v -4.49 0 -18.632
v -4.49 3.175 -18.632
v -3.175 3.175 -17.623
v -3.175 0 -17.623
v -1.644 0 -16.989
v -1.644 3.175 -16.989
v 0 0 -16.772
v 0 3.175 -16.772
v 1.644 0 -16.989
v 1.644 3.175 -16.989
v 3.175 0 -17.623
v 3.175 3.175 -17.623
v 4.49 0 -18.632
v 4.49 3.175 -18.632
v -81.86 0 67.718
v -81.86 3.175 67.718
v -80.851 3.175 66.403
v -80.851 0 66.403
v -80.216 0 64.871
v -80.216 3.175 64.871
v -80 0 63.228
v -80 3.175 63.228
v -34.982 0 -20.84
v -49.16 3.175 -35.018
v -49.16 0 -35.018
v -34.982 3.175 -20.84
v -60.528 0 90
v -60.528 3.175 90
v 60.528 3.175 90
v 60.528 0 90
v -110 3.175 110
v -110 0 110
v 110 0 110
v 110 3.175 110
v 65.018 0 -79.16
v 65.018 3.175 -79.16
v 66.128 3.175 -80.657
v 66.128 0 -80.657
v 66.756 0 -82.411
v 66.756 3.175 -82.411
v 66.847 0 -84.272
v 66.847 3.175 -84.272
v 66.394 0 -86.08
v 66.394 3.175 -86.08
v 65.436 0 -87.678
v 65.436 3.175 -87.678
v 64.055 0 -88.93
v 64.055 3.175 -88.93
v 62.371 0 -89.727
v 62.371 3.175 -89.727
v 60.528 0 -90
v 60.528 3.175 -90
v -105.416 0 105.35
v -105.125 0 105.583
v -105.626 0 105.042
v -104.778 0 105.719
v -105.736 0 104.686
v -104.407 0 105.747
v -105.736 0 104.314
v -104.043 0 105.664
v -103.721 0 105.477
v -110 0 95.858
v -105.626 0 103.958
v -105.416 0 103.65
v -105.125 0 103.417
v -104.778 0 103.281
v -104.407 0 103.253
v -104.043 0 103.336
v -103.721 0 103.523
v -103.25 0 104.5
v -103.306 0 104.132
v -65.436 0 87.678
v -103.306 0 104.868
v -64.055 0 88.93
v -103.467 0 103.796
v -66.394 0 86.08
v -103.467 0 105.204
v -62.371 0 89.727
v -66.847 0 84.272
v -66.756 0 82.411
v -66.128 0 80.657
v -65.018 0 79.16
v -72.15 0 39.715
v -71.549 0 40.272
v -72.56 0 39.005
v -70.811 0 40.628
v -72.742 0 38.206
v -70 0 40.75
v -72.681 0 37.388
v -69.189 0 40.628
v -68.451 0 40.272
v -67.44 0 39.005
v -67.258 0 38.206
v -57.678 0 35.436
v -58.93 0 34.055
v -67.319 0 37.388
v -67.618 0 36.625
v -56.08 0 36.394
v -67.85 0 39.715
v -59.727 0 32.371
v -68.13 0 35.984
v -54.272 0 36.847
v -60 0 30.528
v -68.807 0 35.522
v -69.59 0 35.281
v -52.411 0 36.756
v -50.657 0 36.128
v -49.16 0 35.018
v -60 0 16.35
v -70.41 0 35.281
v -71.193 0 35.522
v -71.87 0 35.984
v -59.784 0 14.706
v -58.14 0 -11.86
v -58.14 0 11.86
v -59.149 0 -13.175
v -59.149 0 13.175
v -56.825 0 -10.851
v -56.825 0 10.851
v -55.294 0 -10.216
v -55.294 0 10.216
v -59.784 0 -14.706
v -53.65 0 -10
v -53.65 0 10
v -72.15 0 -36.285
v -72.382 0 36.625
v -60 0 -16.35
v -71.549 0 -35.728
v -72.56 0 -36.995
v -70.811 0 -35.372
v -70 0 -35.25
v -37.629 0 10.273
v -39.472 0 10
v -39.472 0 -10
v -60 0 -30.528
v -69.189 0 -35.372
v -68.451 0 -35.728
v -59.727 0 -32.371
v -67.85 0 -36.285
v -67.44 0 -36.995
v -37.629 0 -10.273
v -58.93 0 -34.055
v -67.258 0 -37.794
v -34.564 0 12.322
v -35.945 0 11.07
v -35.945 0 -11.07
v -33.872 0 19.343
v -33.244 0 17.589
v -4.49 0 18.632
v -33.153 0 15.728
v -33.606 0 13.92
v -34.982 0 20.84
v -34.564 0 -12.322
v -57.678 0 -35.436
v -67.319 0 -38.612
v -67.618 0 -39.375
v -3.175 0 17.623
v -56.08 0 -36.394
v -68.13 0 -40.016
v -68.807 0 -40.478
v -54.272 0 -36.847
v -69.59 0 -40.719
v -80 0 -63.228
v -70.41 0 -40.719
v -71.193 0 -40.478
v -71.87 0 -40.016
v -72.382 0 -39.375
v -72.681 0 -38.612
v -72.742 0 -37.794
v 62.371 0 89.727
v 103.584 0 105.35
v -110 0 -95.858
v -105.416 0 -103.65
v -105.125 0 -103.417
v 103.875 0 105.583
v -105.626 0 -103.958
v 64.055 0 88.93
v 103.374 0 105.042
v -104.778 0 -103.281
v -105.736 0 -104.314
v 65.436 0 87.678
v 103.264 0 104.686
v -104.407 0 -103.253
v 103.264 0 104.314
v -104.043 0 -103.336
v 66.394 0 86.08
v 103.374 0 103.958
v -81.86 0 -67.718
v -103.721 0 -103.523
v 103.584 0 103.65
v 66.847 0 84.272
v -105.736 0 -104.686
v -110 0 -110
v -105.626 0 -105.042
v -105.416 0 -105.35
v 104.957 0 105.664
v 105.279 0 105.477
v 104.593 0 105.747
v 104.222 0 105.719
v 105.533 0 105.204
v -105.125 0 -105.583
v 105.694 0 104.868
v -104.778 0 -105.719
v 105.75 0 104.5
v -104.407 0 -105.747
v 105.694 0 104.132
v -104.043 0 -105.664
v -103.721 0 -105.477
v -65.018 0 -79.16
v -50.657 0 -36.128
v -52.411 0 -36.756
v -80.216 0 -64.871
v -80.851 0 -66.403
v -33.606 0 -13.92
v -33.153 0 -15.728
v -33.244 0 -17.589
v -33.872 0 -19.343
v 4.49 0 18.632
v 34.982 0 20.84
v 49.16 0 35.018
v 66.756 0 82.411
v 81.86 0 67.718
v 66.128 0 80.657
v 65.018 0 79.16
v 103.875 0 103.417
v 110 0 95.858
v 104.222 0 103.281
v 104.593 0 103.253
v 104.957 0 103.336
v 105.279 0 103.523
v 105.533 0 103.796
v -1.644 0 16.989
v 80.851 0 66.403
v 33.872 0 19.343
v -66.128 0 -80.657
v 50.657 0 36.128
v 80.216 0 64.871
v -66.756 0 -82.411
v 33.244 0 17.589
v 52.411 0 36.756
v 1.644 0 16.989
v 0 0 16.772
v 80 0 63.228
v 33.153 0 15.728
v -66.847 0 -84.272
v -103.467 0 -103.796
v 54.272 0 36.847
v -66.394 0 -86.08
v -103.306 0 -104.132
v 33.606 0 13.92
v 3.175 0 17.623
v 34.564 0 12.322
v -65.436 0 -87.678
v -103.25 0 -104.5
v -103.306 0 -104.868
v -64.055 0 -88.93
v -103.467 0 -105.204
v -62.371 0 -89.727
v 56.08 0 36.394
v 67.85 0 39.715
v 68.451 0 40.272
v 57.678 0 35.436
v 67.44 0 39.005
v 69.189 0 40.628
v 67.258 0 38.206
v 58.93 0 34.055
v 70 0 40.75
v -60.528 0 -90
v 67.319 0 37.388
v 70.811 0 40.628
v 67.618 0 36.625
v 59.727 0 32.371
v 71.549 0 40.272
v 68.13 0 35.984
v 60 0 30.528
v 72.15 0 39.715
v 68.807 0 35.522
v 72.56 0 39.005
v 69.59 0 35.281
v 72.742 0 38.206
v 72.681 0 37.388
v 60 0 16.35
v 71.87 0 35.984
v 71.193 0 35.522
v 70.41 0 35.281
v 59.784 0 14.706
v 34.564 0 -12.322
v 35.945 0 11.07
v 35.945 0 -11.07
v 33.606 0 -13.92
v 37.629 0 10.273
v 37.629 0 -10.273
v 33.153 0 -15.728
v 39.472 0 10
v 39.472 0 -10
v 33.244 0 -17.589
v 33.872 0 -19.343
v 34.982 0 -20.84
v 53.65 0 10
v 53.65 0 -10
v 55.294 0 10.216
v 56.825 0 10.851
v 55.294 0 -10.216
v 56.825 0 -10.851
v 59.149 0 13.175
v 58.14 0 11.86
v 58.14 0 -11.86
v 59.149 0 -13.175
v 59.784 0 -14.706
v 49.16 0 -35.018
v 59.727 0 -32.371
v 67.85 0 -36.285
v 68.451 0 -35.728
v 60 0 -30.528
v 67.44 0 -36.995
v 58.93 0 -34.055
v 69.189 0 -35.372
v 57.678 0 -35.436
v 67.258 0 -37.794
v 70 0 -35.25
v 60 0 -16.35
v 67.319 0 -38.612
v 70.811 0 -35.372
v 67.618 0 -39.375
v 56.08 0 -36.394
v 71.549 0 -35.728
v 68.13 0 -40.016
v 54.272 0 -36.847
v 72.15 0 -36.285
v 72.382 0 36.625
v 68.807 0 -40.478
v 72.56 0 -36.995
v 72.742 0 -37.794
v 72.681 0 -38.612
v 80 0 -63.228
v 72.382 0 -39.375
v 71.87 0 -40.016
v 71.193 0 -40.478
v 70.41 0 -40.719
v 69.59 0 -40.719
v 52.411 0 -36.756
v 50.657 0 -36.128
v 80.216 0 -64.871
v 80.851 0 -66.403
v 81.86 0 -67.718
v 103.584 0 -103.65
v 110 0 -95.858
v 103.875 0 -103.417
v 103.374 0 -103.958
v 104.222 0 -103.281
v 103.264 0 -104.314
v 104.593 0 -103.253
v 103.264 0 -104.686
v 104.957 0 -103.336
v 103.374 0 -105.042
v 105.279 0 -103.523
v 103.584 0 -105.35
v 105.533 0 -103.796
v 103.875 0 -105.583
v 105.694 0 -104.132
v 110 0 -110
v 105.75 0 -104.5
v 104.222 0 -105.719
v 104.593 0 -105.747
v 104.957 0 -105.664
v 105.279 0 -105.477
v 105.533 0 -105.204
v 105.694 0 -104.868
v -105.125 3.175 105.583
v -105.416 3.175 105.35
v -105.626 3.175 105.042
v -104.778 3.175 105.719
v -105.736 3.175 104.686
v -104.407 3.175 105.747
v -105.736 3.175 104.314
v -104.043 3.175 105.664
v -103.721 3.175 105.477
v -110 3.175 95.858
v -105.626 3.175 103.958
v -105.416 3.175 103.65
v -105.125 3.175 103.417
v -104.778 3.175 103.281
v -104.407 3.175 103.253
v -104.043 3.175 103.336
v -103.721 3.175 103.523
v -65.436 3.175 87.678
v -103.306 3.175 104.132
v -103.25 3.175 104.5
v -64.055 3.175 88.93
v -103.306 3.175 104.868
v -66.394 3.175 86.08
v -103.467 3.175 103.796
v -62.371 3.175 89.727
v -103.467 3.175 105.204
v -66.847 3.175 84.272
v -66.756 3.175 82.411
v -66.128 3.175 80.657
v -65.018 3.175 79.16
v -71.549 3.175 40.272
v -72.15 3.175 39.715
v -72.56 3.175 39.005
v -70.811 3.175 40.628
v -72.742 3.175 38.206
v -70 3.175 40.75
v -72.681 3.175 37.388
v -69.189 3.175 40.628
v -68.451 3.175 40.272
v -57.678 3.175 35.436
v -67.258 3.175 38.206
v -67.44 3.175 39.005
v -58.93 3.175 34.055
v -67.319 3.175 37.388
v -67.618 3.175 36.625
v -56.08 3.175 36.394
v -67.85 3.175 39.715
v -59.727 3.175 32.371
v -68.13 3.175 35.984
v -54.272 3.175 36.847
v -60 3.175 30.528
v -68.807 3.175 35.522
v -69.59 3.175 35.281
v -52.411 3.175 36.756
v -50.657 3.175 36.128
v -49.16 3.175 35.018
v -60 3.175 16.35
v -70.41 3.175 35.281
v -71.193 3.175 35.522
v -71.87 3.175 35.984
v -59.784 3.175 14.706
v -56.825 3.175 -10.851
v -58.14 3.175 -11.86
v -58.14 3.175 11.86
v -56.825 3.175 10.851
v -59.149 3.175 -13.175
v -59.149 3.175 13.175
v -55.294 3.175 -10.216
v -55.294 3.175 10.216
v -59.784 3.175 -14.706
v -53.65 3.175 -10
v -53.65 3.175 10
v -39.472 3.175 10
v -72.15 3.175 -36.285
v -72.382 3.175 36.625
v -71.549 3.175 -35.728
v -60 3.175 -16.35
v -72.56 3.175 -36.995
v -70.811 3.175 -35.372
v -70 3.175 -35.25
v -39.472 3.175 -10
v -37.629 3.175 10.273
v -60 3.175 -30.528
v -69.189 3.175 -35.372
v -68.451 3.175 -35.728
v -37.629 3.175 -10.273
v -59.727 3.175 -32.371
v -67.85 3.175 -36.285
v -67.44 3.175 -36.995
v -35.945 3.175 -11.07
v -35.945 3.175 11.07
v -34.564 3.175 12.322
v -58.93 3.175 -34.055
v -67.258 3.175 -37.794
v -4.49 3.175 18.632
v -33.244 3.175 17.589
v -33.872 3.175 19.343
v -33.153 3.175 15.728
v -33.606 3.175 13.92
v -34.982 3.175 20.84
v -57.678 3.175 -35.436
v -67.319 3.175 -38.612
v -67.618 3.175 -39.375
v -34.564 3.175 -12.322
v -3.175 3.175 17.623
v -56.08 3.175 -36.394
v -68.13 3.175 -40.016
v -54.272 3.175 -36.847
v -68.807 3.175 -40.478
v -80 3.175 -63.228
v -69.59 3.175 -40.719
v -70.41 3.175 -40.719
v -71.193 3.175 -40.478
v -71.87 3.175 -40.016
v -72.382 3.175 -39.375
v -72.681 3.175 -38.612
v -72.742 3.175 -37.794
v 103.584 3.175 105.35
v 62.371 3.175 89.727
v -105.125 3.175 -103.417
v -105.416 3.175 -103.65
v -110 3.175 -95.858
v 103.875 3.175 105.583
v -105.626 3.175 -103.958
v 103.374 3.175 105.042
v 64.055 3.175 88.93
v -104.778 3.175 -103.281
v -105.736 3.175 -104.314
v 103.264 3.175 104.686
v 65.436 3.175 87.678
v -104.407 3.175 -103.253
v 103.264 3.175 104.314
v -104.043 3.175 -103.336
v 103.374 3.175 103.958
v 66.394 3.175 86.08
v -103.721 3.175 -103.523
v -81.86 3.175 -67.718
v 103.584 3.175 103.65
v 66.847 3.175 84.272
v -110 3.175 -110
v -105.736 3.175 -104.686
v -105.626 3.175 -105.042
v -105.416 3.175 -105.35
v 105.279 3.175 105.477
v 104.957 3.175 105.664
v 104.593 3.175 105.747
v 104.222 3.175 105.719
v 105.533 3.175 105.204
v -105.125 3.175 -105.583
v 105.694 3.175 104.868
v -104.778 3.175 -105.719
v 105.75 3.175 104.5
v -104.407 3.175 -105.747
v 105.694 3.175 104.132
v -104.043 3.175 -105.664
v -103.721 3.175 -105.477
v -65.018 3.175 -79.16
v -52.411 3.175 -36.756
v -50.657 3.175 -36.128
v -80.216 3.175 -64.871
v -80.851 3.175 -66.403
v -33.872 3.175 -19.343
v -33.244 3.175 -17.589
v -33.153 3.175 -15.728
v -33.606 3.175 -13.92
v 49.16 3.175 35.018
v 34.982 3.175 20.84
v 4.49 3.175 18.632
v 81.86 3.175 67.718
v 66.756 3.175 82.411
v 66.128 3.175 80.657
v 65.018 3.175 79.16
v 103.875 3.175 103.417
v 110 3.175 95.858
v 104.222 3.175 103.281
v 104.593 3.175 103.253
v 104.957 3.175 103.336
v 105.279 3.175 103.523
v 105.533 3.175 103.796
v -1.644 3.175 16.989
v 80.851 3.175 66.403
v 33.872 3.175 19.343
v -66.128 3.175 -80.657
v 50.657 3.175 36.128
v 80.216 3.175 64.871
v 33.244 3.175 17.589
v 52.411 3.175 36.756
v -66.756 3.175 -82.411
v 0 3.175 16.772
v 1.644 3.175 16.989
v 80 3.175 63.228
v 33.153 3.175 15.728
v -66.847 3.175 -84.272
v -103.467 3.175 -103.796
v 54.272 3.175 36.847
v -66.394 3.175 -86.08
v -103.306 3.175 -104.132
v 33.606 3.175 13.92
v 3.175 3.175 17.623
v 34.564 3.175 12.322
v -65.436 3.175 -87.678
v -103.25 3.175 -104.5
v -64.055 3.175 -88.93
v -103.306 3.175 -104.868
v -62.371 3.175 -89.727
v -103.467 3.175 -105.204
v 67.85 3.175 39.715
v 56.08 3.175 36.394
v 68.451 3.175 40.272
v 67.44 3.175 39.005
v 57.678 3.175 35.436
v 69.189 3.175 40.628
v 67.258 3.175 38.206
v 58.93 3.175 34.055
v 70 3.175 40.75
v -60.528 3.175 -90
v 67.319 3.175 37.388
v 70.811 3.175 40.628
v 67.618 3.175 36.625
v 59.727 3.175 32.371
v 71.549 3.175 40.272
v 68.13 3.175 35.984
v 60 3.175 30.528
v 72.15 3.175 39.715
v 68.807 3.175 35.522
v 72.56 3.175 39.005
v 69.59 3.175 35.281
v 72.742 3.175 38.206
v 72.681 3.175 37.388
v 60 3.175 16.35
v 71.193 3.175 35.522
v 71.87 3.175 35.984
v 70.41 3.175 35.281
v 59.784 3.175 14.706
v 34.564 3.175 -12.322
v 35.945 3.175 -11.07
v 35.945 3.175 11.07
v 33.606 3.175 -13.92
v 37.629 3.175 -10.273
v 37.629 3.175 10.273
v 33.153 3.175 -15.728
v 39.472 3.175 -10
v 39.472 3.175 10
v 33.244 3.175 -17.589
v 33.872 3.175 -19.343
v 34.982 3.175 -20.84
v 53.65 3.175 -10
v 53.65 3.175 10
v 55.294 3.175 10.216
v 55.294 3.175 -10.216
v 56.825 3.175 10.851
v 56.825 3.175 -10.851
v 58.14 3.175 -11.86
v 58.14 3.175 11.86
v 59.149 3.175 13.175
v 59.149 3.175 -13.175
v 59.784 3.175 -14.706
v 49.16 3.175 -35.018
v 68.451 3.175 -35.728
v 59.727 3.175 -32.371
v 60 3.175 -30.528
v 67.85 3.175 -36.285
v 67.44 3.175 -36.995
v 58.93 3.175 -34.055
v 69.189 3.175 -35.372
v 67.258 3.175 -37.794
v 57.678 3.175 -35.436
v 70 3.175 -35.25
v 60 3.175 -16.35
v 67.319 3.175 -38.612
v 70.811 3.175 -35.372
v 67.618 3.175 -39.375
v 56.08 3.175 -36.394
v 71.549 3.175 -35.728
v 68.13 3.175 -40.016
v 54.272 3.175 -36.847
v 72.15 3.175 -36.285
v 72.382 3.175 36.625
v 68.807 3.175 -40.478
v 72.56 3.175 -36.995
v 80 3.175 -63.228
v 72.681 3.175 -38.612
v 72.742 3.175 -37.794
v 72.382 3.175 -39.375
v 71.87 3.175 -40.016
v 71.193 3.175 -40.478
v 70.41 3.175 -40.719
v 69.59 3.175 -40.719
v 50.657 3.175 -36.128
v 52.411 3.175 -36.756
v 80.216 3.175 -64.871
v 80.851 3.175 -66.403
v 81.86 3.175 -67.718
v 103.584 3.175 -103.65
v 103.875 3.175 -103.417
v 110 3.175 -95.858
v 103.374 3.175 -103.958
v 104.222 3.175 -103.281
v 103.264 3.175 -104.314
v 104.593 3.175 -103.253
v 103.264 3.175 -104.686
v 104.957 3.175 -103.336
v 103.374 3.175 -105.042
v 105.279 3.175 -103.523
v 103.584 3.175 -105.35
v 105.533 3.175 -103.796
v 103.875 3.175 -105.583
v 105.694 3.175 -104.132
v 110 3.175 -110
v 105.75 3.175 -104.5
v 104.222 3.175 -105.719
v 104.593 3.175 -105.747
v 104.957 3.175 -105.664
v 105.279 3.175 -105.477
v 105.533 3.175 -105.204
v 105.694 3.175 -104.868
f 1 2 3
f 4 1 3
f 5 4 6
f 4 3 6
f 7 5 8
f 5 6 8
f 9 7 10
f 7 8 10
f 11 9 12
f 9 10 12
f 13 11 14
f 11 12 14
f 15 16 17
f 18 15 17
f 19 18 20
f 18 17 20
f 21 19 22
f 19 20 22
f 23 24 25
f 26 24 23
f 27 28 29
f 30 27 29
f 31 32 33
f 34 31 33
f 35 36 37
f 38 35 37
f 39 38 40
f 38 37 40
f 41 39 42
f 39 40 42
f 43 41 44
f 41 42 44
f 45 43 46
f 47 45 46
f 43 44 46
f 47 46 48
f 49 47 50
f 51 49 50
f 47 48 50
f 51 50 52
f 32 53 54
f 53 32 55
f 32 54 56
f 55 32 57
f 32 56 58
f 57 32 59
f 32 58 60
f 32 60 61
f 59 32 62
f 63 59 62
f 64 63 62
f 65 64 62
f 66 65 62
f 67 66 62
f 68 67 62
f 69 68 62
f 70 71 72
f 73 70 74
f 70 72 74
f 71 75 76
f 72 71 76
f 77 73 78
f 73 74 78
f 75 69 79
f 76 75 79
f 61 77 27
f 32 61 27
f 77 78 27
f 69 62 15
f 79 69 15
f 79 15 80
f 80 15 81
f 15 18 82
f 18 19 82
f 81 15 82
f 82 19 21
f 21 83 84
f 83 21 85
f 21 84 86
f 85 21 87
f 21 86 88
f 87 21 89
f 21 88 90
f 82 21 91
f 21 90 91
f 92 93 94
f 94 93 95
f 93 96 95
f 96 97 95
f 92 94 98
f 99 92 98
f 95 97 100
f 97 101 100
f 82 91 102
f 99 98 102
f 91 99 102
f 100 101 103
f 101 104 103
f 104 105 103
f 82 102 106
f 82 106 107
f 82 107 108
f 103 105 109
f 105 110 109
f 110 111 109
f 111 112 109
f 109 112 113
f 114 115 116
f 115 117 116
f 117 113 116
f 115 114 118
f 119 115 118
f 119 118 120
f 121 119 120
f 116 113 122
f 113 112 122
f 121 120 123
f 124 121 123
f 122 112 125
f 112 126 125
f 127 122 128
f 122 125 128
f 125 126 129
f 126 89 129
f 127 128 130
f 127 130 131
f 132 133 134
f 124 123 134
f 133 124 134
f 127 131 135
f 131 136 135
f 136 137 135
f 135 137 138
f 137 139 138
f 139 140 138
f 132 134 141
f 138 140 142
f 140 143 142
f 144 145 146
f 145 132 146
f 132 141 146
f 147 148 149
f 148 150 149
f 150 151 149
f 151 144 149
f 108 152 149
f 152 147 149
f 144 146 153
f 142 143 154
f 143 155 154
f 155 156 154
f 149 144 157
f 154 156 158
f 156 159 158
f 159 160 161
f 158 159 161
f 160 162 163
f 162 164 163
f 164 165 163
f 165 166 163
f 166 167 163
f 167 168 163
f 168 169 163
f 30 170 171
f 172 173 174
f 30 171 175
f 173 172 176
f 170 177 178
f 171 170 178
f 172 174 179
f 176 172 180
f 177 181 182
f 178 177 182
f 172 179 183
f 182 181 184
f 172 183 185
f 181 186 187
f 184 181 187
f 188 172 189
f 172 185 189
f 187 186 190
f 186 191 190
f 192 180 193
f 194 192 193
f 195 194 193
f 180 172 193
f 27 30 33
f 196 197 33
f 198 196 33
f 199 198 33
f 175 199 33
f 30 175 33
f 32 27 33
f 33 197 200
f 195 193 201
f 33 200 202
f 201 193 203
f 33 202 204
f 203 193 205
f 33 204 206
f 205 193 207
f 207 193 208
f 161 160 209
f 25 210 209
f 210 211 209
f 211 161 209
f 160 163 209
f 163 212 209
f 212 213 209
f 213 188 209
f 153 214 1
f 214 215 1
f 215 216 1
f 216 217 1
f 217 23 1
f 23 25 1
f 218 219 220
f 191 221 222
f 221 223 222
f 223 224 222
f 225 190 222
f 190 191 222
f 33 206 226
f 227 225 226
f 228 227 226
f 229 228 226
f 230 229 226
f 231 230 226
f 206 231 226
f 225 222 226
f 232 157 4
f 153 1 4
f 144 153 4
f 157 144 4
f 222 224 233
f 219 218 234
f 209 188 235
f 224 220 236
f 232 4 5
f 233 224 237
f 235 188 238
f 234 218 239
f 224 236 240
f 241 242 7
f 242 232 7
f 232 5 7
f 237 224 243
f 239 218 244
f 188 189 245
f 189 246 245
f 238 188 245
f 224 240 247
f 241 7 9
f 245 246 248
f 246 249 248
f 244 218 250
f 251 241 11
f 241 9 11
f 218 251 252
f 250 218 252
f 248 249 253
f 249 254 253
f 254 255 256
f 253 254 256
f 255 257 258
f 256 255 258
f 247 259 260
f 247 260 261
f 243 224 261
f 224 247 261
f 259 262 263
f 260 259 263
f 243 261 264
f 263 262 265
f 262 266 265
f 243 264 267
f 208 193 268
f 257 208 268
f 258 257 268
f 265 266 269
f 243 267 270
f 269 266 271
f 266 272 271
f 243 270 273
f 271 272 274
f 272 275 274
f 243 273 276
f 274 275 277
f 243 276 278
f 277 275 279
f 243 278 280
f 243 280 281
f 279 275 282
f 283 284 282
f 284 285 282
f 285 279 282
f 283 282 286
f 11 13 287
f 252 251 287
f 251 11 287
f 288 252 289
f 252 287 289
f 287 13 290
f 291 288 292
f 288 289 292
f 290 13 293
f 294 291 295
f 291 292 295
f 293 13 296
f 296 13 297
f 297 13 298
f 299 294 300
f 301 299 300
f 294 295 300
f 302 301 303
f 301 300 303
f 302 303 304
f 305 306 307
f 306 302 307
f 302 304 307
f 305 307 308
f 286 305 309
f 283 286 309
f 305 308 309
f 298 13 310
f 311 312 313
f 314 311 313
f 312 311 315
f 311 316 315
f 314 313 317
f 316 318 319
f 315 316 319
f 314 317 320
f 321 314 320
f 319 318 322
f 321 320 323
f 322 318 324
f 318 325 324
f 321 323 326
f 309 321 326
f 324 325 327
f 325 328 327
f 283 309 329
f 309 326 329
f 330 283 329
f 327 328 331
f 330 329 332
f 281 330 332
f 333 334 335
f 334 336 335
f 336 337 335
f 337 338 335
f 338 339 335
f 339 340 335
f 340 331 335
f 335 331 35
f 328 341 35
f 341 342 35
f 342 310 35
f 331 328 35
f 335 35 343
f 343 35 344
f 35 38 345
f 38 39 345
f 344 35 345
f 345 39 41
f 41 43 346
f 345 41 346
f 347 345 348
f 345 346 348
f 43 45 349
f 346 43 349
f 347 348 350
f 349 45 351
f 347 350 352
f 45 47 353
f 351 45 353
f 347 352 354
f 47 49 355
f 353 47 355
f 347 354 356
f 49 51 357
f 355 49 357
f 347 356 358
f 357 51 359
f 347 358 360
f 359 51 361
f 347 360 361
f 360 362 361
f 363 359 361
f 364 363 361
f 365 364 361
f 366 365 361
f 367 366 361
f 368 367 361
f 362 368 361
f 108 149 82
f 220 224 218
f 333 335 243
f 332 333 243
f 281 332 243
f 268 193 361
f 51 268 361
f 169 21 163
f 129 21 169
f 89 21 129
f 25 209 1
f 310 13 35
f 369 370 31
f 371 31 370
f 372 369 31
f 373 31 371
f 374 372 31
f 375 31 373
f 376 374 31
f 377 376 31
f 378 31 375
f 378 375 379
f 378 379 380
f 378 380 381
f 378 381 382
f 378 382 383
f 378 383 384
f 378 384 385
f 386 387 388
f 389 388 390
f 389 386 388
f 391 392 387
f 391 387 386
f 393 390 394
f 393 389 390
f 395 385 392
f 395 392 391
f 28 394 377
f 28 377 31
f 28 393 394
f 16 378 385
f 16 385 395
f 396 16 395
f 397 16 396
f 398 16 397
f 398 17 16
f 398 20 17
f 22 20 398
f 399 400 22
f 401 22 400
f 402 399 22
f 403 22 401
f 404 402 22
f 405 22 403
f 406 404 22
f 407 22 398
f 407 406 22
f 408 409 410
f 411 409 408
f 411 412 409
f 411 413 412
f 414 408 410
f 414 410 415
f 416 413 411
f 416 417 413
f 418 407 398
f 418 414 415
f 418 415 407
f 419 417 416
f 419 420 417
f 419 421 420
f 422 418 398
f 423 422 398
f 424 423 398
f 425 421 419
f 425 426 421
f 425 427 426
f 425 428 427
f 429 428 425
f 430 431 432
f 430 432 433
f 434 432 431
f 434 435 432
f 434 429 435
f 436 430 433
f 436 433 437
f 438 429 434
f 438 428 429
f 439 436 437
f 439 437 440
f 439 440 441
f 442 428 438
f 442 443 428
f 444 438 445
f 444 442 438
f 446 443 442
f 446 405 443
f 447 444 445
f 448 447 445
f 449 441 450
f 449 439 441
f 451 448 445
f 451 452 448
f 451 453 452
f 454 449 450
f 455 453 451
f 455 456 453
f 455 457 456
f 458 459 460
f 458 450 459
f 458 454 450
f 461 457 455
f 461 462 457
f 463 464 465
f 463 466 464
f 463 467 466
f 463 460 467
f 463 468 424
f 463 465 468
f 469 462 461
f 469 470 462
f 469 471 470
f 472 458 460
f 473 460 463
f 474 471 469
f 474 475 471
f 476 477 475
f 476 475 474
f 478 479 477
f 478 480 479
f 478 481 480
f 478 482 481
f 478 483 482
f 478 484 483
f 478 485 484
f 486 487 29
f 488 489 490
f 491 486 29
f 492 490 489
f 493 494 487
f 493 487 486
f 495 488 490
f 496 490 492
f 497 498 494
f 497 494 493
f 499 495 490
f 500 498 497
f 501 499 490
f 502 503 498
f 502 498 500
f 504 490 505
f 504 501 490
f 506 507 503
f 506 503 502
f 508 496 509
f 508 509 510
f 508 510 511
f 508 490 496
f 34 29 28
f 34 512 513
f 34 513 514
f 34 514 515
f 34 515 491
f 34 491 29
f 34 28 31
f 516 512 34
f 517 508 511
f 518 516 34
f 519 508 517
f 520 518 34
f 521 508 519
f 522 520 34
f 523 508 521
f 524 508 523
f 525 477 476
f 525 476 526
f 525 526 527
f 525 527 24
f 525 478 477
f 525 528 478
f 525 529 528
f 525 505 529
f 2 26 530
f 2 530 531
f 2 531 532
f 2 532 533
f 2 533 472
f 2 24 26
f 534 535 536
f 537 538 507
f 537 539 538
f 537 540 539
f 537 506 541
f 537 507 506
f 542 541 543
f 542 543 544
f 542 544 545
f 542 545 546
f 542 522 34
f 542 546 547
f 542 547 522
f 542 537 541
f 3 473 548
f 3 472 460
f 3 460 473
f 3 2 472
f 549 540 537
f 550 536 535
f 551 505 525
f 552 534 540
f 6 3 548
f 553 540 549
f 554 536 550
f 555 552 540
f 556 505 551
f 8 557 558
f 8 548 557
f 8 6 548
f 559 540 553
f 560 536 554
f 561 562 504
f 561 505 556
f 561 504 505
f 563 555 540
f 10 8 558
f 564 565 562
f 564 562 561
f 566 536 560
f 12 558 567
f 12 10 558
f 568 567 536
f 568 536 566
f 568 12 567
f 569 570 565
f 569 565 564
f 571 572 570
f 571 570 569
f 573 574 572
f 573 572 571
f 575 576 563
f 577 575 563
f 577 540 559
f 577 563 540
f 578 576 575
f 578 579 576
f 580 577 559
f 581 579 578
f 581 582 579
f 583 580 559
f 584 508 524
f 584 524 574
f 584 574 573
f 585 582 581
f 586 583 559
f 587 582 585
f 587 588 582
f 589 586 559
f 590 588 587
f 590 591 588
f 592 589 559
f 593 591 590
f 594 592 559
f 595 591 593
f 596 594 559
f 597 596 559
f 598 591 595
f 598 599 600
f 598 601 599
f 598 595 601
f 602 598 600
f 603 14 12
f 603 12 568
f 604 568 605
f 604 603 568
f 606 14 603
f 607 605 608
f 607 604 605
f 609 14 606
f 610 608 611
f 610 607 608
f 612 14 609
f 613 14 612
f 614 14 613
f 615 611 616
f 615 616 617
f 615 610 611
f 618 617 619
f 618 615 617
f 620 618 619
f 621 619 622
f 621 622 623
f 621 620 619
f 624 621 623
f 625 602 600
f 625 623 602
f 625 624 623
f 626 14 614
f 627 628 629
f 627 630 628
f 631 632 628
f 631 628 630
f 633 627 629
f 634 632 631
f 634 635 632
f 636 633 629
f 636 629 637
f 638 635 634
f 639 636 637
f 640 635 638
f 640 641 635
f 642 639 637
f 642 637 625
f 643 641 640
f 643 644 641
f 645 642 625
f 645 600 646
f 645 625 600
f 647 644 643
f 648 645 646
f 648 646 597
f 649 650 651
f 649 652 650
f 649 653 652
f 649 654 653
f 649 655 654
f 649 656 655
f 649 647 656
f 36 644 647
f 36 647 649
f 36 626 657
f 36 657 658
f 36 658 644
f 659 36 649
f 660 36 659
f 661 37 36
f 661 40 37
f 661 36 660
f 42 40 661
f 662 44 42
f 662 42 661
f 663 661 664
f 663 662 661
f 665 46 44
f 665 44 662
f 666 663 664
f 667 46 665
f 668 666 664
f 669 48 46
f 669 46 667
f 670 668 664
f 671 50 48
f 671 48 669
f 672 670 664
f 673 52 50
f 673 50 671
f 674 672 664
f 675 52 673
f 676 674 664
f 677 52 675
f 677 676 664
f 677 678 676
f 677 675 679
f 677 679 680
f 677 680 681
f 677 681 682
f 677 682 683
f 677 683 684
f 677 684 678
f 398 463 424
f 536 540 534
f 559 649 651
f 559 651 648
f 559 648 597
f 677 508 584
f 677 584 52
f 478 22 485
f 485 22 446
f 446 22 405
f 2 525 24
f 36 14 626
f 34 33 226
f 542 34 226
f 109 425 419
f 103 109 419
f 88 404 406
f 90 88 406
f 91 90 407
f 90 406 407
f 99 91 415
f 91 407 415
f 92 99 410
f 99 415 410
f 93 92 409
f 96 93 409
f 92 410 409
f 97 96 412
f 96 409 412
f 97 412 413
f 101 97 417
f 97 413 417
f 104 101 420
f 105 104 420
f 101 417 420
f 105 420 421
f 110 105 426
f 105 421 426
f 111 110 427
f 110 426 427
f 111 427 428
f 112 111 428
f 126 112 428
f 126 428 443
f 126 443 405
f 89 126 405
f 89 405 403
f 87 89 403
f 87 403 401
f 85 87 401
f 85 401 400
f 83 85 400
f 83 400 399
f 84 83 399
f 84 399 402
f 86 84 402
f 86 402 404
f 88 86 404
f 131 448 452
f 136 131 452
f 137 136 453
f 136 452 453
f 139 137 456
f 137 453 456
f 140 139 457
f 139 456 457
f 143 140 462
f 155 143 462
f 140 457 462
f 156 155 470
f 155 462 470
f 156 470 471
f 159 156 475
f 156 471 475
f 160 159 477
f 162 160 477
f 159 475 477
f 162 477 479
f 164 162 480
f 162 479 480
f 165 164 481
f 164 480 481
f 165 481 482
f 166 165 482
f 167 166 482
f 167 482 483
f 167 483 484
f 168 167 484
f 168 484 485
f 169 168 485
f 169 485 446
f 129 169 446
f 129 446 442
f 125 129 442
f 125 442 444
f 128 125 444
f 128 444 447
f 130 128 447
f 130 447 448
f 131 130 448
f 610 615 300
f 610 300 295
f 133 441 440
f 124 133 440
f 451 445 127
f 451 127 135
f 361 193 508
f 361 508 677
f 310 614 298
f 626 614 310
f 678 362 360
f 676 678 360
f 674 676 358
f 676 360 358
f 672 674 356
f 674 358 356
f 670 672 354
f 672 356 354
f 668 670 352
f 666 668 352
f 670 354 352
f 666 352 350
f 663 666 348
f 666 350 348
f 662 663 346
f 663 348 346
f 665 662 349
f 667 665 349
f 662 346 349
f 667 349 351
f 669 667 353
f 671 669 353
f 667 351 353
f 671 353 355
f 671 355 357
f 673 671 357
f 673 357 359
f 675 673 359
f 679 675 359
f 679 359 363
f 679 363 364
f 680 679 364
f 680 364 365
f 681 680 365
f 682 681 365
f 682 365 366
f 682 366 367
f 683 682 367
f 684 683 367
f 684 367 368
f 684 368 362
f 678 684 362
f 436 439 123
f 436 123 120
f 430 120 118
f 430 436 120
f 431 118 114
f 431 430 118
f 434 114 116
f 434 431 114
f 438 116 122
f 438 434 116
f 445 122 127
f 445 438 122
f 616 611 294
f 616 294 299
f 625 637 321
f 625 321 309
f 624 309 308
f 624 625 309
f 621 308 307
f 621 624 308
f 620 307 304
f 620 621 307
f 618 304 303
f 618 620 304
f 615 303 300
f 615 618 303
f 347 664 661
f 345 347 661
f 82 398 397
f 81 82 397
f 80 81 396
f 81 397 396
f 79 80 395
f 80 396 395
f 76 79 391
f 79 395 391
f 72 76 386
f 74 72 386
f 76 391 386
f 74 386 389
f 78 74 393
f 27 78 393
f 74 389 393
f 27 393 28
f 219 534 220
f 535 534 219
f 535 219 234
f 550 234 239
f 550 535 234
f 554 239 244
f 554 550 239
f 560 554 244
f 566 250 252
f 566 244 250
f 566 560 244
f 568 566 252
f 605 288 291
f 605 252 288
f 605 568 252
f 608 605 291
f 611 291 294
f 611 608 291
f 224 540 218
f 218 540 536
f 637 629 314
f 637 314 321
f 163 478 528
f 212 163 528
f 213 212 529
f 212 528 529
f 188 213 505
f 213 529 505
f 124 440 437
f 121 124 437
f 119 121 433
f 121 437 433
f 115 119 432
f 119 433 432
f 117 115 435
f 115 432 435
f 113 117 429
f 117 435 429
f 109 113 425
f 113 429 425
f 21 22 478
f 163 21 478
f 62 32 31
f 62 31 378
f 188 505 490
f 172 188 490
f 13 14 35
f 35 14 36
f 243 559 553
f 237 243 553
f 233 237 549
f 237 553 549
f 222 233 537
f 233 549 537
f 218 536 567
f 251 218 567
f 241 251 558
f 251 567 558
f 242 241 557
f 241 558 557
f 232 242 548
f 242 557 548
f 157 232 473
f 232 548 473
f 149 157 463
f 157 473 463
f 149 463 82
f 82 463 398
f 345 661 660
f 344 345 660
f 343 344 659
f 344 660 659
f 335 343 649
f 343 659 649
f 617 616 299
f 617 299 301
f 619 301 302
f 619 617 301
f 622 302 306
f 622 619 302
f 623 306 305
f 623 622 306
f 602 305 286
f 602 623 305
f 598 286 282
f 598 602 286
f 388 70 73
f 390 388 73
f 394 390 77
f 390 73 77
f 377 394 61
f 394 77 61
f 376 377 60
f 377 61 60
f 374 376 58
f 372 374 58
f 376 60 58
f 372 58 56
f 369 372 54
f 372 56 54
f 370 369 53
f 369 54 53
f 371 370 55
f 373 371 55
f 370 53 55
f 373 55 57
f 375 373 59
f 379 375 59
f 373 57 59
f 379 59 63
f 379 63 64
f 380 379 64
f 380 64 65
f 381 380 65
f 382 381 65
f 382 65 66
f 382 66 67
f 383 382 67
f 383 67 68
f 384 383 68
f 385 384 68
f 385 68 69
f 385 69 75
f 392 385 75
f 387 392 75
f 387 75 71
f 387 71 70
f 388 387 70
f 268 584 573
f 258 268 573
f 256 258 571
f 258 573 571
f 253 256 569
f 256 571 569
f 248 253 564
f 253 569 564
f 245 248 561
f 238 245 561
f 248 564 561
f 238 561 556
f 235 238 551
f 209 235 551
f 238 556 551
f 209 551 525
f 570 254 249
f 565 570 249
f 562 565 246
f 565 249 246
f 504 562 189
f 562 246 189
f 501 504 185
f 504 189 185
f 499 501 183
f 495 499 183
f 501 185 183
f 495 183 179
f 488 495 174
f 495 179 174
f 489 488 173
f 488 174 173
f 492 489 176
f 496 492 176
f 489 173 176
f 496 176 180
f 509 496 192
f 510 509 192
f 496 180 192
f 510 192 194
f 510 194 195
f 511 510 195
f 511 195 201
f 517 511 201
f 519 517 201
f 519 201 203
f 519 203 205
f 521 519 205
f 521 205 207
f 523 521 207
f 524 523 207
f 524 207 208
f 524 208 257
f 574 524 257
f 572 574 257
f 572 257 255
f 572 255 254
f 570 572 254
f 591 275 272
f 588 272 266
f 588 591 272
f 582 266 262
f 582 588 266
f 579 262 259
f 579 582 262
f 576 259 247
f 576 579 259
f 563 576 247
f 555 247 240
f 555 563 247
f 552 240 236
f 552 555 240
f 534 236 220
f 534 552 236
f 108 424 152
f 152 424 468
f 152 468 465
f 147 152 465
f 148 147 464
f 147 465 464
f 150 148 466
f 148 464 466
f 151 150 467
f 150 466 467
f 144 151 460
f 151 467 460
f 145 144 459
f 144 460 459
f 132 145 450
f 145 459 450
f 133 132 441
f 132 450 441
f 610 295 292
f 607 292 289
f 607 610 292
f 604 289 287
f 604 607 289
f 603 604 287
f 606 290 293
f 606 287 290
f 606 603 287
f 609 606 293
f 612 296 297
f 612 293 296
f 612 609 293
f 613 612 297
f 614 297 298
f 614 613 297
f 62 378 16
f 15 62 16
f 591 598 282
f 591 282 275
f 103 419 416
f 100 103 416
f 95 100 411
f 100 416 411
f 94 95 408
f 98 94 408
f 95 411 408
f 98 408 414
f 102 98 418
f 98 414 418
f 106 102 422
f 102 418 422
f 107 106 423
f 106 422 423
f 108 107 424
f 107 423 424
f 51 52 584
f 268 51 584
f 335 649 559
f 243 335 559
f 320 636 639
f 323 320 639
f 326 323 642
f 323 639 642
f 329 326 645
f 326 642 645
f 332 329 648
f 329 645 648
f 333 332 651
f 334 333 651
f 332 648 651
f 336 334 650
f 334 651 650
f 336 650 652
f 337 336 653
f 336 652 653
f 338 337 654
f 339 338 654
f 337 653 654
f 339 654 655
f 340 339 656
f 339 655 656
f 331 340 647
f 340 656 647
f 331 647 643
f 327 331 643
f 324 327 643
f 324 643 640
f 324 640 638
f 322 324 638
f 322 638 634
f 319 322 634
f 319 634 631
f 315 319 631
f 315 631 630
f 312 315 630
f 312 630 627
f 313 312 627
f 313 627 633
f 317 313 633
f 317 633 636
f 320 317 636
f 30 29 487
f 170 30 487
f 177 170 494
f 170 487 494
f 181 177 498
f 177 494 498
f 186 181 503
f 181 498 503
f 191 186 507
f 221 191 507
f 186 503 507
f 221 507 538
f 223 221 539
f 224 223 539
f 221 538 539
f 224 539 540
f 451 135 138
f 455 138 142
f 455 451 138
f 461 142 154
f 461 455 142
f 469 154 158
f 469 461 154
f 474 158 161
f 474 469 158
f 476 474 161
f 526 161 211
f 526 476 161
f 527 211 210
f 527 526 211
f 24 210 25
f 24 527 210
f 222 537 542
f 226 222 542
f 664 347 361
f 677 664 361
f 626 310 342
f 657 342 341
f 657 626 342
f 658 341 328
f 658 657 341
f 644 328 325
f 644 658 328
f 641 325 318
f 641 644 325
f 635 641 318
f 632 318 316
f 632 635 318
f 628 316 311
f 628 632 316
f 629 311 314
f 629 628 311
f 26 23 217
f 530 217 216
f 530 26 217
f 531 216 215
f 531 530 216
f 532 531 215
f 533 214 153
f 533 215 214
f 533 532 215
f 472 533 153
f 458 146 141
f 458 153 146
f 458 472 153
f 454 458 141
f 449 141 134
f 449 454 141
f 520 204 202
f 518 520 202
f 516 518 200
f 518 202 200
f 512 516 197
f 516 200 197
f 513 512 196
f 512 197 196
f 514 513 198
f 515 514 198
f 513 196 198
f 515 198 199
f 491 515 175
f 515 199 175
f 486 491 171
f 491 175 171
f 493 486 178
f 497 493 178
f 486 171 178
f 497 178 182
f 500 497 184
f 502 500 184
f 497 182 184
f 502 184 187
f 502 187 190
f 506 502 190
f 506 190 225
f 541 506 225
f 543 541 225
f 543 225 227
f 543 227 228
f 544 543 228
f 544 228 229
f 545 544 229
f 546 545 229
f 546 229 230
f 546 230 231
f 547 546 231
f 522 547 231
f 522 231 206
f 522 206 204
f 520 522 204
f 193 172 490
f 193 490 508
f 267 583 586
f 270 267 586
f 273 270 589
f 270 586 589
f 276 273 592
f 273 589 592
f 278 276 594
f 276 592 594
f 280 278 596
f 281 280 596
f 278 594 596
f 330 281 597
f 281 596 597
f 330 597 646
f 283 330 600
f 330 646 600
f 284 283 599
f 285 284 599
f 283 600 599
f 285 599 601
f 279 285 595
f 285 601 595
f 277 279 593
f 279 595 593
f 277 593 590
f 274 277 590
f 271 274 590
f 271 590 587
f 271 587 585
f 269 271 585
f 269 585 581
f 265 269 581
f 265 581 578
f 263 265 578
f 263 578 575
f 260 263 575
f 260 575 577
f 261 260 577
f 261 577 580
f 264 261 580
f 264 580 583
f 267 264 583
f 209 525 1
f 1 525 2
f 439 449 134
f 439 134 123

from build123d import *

# Parameters (mm, degrees)
SKETCH1_W             = 220
SKETCH1_H             = 220
BOSS_EXTRUDE1_DEPTH   = 3.175
M3X0_5_TAPPED_HOLE1_D = 2.5
SKETCH4_R             = 2.75
CUT_EXTRUDE1_DEPTH    = 4.175
CUT_EXTRUDE2_DEPTH    = 4.175


with BuildPart() as part:
    # Sketch1 → Boss-Extrude1 (new body)
    with BuildSketch(Plane(origin=(0, 0, 0), x_dir=(1, 0, 0), z_dir=(0, 1, 0))):
        Rectangle(SKETCH1_W, SKETCH1_H)
    extrude(amount=BOSS_EXTRUDE1_DEPTH)

    # M3x0.5 Tapped Hole1 (through all)
    with Locations(Plane(origin=(0, 3.175, 0), x_dir=(-1, 0, 0), z_dir=(0, 1, 0))):
        with Locations((104.5, -104.5), (-104.5, -104.5), (-104.5, 104.5), (104.5, 104.5)):
            Hole(M3X0_5_TAPPED_HOLE1_D / 2)

    # Sketch4 → Cut-Extrude1 (cut, through all)
    with BuildSketch(Plane(origin=(0, 3.175, 0), x_dir=(1, 0, 0), z_dir=(0, 1, 0))):
        with Locations(Location((-70, 38, 0), (0, 0, 270))):  # turned: the seam where the file's is
            Circle(SKETCH4_R)
        with Locations(Location((-70, -38, 0), (0, 0, 270))):  # turned: the seam where the file's is
            Circle(SKETCH4_R)
        with Locations(Location((70, -38, 0), (0, 0, 270))):  # turned: the seam where the file's is
            Circle(SKETCH4_R)
        with Locations(Location((70, 38, 0), (0, 0, 270))):  # turned: the seam where the file's is
            Circle(SKETCH4_R)
    extrude(amount=-CUT_EXTRUDE1_DEPTH, mode=Mode.SUBTRACT)

    # Sketch5 → Cut-Extrude2 (cut, through all)
    with BuildSketch(Plane(origin=(0, 3.175, 0), x_dir=(1, 0, 0), z_dir=(0, 1, 0))):
        with BuildLine():
            Line((-65.017736316, 79.159871939), (-4.490128061, 18.632263684))
            ThreePointArc((-4.490128061, 18.632263684), (0, 16.772391745), (4.490128061, 18.632263684))
            Line((4.490128061, 18.632263684), (65.017736316, 79.159871939))
            ThreePointArc((65.017736316, 79.159871939), (66.394243287, 86.080039796), (60.527608255, 90))
            Line((60.527608255, 90), (-60.527608255, 90))
            ThreePointArc((-60.527608255, 90), (-66.394243287, 86.080039796), (-65.017736316, 79.159871939))
        make_face()
        with BuildLine():
            Line((-4.490128061, -18.632263684), (-65.017736316, -79.159871939))
            ThreePointArc((-65.017736316, -79.159871939), (-66.394243287, -86.080039796), (-60.527608255, -90))
            Line((-60.527608255, -90), (60.527608255, -90))
            ThreePointArc((60.527608255, -90), (66.394243287, -86.080039796), (65.017736316, -79.159871939))
            Line((65.017736316, -79.159871939), (4.490128061, -18.632263684))
            ThreePointArc((4.490128061, -18.632263684), (0, -16.772391745), (-4.490128061, -18.632263684))
        make_face()
        with BuildLine():
            Line((-60, -16.35), (-60, -30.527608255))
            ThreePointArc((-60, -30.527608255), (-56.080039796, -36.394243287), (-49.159871939, -35.017736316))
            Line((-49.159871939, -35.017736316), (-34.982263684, -20.840128061))
            ThreePointArc((-34.982263684, -20.840128061), (-33.605756713, -13.919960204), (-39.472391745, -10))
            Line((-39.472391745, -10), (-53.65, -10))
            ThreePointArc((-53.65, -10), (-58.140128061, -11.859871939), (-60, -16.35))
        make_face()
        with BuildLine():
            Line((39.472391745, -10), (53.65, -10))
            ThreePointArc((53.65, -10), (58.140128061, -11.859871939), (60, -16.35))
            Line((60, -16.35), (60, -30.527608255))
            ThreePointArc((60, -30.527608255), (56.080039796, -36.394243287), (49.159871939, -35.017736316))
            Line((49.159871939, -35.017736316), (34.982263684, -20.840128061))
            ThreePointArc((34.982263684, -20.840128061), (33.605756713, -13.919960204), (39.472391745, -10))
        make_face()
        with BuildLine():
            Line((34.982263684, 20.840128061), (49.159871939, 35.017736316))
            ThreePointArc((49.159871939, 35.017736316), (56.080039796, 36.394243287), (60, 30.527608255))
            Line((60, 30.527608255), (60, 16.35))
            ThreePointArc((60, 16.35), (58.140128061, 11.859871939), (53.65, 10))
            Line((53.65, 10), (39.472391745, 10))
            ThreePointArc((39.472391745, 10), (33.605756713, 13.919960204), (34.982263684, 20.840128061))
        make_face()
        with BuildLine():
            Line((-39.472391745, 10), (-53.65, 10))
            ThreePointArc((-53.65, 10), (-58.140128061, 11.859871939), (-60, 16.35))
            Line((-60, 16.35), (-60, 30.527608255))
            ThreePointArc((-60, 30.527608255), (-56.080039796, 36.394243287), (-49.159871939, 35.017736316))
            Line((-49.159871939, 35.017736316), (-34.982263684, 20.840128061))
            ThreePointArc((-34.982263684, 20.840128061), (-33.605756713, 13.919960204), (-39.472391745, 10))
        make_face()
        with BuildLine():
            Line((-110, 95.857864376), (-110, -95.857864376))
            Line((-110, -95.857864376), (-81.859871939, -67.717736316))
            ThreePointArc((-81.859871939, -67.717736316), (-80.483364969, -65.657648051), (-80, -63.227608255))
            Line((-80, -63.227608255), (-80, 63.227608255))
            ThreePointArc((-80, 63.227608255), (-80.483364969, 65.657648051), (-81.859871939, 67.717736316))
            Line((-81.859871939, 67.717736316), (-110, 95.857864376))
        make_face()
        with BuildLine():
            Line((110, 95.857864376), (81.859871939, 67.717736316))
            ThreePointArc((81.859871939, 67.717736316), (80.483364969, 65.657648051), (80, 63.227608255))
            Line((80, 63.227608255), (80, -63.227608255))
            ThreePointArc((80, -63.227608255), (80.483364969, -65.657648051), (81.859871939, -67.717736316))
            Line((81.859871939, -67.717736316), (110, -95.857864376))
            Line((110, -95.857864376), (110, 95.857864376))
        make_face()
    extrude(amount=-CUT_EXTRUDE2_DEPTH, mode=Mode.SUBTRACT)


solid = part.part
